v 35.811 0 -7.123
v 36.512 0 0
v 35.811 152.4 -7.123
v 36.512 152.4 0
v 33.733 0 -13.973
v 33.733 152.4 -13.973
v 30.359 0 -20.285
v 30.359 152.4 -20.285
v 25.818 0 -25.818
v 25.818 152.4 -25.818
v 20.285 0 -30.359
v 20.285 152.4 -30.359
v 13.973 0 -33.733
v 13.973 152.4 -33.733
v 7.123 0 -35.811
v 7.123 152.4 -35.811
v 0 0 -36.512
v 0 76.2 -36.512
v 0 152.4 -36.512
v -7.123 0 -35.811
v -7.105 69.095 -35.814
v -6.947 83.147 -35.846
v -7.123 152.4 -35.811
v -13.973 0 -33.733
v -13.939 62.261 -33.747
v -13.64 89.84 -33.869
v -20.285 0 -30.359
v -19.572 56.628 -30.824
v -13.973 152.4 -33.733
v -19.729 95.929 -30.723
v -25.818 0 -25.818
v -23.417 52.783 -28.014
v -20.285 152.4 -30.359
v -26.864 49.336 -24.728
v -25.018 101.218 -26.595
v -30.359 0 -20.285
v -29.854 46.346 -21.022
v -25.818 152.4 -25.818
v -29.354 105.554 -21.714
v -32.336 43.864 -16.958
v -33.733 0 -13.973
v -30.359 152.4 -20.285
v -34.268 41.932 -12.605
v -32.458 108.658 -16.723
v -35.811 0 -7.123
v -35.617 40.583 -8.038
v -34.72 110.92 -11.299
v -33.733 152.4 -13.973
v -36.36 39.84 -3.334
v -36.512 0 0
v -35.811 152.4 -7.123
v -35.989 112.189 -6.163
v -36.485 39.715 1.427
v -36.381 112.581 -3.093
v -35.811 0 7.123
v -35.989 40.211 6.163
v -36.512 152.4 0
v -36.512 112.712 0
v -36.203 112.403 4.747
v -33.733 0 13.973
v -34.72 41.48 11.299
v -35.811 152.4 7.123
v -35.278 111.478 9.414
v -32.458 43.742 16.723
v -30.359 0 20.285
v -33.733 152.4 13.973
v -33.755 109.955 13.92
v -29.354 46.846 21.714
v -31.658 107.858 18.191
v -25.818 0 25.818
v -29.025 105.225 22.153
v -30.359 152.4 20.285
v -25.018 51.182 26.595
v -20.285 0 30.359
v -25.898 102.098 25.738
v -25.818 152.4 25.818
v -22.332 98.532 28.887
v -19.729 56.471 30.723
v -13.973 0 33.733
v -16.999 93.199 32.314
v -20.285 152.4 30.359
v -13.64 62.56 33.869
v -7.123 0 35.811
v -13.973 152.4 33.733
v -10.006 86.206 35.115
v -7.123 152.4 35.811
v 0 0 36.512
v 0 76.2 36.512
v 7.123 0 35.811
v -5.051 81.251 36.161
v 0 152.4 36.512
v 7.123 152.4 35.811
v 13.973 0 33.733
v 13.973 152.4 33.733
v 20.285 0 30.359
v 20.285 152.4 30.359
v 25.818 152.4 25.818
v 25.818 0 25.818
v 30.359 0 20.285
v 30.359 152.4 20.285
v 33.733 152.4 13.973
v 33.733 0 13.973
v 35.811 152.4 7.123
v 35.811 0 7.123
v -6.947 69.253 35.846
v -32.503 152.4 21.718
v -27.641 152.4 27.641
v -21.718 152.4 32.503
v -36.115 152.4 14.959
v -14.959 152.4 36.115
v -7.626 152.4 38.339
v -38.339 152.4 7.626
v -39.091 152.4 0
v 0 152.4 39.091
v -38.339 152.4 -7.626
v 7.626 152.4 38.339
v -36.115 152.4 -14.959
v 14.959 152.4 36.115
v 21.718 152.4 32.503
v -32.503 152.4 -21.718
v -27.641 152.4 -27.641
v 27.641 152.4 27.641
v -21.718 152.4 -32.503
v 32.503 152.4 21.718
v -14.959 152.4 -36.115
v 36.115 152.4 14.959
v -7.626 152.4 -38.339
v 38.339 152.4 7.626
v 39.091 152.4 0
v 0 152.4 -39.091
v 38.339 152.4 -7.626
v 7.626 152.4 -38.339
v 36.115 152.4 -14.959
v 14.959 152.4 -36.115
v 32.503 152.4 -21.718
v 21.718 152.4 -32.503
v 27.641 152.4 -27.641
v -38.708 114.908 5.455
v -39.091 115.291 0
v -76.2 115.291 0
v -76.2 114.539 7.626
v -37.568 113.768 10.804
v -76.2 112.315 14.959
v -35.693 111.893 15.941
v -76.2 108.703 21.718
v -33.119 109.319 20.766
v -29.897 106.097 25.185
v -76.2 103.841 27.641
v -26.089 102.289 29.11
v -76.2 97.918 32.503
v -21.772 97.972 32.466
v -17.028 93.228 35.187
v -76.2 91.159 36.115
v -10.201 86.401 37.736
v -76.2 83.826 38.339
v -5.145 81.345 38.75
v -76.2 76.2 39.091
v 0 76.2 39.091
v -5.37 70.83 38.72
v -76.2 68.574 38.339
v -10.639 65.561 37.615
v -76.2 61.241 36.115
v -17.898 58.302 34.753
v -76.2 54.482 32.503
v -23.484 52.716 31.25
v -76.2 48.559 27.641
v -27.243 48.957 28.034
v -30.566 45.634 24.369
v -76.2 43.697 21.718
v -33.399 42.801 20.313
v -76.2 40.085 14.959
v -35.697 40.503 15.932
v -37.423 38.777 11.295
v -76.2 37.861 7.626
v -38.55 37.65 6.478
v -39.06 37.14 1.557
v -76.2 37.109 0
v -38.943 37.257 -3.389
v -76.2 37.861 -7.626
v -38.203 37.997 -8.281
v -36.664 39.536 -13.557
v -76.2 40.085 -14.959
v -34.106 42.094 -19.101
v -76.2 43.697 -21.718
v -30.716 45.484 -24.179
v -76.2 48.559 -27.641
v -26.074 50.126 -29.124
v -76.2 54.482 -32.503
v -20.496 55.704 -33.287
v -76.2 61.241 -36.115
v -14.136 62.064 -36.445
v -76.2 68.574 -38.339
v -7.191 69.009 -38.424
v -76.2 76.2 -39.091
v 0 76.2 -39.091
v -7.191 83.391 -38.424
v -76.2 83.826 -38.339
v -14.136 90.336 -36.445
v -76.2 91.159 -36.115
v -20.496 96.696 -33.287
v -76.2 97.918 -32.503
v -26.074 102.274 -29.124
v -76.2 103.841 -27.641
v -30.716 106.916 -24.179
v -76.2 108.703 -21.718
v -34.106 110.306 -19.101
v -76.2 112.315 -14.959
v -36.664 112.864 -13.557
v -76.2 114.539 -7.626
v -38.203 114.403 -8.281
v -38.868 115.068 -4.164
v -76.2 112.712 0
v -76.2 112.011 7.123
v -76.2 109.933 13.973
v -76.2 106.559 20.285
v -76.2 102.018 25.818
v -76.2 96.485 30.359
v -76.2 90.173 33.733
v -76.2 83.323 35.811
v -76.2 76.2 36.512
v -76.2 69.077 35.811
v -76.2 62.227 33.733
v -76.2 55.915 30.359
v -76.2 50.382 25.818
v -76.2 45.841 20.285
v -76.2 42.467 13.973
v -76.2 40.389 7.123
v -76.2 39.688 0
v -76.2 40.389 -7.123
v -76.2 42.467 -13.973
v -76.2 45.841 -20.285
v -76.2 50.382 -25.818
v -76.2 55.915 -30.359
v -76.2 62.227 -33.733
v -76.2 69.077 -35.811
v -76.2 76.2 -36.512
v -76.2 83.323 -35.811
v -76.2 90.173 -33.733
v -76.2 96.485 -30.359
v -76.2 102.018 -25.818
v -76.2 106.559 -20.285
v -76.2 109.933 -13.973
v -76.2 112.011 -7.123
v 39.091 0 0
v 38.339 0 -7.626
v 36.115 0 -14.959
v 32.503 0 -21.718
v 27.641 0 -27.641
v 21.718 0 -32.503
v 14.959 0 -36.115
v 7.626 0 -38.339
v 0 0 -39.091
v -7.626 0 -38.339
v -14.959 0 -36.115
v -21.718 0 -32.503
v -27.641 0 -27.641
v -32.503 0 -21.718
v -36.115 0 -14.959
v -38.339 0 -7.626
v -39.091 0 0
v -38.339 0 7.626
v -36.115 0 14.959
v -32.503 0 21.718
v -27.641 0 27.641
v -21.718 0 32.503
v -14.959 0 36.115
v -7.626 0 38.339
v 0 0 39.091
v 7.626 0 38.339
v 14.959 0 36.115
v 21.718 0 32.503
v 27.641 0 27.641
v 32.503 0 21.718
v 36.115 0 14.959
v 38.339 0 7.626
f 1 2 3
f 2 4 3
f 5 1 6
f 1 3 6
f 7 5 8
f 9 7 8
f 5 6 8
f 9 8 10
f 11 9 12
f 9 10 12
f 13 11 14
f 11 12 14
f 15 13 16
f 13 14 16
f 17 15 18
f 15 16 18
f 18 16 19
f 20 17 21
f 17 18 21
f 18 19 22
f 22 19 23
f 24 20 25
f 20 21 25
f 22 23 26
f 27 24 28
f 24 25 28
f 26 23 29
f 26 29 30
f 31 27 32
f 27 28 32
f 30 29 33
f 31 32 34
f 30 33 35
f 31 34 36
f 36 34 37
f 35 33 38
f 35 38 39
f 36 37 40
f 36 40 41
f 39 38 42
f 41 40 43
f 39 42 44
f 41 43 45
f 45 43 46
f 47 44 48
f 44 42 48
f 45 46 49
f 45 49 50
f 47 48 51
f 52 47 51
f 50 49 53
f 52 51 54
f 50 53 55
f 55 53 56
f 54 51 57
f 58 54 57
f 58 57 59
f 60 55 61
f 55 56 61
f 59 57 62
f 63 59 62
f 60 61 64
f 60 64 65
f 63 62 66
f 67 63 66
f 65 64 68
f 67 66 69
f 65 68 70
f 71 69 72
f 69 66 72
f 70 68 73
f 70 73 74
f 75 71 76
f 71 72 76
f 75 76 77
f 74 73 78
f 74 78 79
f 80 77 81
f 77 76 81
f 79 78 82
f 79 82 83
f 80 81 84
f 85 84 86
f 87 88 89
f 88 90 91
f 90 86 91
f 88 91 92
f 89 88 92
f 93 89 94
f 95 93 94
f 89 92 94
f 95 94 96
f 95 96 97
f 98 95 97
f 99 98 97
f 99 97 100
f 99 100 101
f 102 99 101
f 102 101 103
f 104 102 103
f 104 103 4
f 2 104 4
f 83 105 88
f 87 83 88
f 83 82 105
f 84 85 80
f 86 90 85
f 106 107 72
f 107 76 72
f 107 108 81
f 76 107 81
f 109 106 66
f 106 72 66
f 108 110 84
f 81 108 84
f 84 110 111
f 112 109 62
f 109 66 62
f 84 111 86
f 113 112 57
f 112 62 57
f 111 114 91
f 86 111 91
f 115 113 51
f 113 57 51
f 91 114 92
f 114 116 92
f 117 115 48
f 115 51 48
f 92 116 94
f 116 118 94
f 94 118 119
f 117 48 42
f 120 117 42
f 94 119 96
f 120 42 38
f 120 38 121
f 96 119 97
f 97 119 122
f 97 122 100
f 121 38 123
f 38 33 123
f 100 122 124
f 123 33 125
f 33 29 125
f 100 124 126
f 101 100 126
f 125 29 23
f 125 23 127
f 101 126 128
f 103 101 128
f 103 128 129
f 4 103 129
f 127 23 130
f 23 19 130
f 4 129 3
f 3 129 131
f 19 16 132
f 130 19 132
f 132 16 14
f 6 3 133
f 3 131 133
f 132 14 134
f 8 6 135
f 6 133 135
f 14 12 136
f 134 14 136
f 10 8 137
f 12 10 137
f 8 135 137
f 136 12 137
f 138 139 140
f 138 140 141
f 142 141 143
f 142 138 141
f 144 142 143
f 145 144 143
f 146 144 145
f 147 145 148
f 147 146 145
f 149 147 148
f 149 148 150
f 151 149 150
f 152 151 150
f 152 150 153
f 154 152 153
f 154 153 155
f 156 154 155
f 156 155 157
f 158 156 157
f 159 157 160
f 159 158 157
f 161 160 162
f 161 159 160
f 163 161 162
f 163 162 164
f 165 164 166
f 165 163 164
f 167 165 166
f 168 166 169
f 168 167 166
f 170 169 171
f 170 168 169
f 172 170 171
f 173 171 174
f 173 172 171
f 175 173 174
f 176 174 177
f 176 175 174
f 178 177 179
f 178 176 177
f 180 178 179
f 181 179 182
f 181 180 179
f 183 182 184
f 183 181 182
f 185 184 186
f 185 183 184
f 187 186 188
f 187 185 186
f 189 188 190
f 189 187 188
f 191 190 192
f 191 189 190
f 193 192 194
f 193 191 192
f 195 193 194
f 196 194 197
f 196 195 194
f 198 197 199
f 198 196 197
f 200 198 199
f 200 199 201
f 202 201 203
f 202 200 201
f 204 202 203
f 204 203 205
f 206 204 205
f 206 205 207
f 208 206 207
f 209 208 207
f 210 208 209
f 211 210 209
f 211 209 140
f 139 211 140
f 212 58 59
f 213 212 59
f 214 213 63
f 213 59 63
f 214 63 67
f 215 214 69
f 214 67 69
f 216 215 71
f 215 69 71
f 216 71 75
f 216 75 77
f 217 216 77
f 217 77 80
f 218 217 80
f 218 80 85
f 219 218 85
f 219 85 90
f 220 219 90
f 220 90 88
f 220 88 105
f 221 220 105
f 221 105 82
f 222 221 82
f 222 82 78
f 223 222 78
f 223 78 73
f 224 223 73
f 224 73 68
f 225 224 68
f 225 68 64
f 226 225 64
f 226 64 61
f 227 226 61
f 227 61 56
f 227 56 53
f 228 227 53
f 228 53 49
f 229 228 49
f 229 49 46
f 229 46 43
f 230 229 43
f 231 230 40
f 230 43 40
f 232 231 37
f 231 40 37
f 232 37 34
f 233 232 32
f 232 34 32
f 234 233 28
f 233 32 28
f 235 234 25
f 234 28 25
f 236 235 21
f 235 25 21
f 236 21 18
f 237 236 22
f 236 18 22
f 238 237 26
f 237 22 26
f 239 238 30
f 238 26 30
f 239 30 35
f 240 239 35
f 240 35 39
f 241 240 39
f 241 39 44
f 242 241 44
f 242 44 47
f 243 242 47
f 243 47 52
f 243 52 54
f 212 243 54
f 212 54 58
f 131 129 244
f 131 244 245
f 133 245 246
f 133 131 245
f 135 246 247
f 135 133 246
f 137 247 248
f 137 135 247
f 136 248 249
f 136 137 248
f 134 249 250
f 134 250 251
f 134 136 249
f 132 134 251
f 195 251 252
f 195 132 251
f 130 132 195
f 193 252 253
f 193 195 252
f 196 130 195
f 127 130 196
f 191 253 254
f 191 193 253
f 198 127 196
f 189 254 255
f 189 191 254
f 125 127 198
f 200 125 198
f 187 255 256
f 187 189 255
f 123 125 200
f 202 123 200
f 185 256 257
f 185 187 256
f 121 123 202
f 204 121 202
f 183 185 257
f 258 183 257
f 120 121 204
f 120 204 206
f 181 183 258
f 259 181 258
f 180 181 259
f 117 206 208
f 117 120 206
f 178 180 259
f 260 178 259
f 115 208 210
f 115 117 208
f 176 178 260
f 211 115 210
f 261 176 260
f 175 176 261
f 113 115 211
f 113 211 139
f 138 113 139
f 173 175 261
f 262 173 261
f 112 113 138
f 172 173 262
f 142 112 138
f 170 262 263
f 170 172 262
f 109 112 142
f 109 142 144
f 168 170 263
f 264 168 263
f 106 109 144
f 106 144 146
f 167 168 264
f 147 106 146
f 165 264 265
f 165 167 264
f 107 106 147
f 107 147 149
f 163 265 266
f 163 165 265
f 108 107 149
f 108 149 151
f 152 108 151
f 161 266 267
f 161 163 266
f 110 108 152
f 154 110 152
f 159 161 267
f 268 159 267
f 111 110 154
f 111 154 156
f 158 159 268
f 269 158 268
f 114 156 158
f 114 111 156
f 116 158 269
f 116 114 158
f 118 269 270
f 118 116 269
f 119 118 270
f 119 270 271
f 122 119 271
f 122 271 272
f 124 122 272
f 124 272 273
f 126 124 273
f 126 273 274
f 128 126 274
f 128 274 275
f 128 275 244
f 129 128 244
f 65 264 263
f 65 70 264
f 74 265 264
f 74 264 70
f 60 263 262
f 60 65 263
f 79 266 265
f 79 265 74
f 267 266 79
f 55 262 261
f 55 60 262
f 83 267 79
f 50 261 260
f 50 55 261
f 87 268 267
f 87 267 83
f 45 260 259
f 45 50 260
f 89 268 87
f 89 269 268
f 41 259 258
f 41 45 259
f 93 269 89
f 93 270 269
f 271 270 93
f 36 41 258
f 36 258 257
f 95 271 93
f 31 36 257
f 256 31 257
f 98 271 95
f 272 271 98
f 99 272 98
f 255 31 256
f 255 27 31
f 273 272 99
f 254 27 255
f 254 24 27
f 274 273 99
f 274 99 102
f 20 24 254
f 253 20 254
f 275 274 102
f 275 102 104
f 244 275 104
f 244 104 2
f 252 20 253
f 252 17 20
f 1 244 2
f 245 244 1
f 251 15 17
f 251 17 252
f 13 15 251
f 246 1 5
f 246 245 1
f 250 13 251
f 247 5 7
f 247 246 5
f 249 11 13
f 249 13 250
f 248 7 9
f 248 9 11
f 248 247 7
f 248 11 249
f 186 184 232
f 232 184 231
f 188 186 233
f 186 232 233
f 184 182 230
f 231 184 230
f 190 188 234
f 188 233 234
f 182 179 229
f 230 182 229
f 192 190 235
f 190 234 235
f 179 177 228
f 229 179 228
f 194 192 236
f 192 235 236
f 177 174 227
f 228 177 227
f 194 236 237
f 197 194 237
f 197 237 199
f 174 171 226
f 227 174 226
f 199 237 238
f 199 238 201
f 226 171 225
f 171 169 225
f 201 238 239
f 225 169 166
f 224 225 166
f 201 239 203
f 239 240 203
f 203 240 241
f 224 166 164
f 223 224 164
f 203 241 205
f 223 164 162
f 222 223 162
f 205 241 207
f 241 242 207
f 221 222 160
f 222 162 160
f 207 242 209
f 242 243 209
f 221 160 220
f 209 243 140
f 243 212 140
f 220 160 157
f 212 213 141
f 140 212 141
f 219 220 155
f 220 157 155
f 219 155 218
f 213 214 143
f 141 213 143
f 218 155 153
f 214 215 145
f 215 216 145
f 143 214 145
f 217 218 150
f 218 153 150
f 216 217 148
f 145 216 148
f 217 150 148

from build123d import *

# Parameters (mm, degrees)
F0_R     = 39.0906
F0_R_2   = 36.5125
F3_R     = 36.5125
F4_DEPTH = 47.498
F5_R     = 39.0906
F5_R_2   = 36.5125
F6_DEPTH = 76.2
F7_R     = 36.5125
F8_DEPTH = 156.718


with BuildPart() as f2:
    # F2: sweep along a path in F1
    with BuildLine(Plane.YZ) as f2_path:
        Line((0, 0), (152.4, 0))
    # F0 (on Front) → F2 (sweep)
    with BuildSketch(Plane.XZ):
        Circle(F0_R)
        Circle(F0_R_2, mode=Mode.SUBTRACT)
    sweep(path=f2_path.line)

    # F3 (on Right) → F4 (cut)
    with BuildSketch(Plane.YZ):
        with Locations((76.2, 0)):
            Circle(F3_R)
    extrude(amount=-F4_DEPTH, mode=Mode.SUBTRACT)

    # F5 (on Right) → F6 (join)
    with BuildSketch(Plane.YZ):
        with Locations((76.2, 0)):
            Circle(F5_R)
        with Locations((76.2, 0)):
            Circle(F5_R_2, mode=Mode.SUBTRACT)
    extrude(amount=-F6_DEPTH)

    # F7 (on Front) → F8 (cut)
    with BuildSketch(Plane.XZ):
        Circle(F7_R)
    extrude(amount=-F8_DEPTH, mode=Mode.SUBTRACT)


solid = f2.part
